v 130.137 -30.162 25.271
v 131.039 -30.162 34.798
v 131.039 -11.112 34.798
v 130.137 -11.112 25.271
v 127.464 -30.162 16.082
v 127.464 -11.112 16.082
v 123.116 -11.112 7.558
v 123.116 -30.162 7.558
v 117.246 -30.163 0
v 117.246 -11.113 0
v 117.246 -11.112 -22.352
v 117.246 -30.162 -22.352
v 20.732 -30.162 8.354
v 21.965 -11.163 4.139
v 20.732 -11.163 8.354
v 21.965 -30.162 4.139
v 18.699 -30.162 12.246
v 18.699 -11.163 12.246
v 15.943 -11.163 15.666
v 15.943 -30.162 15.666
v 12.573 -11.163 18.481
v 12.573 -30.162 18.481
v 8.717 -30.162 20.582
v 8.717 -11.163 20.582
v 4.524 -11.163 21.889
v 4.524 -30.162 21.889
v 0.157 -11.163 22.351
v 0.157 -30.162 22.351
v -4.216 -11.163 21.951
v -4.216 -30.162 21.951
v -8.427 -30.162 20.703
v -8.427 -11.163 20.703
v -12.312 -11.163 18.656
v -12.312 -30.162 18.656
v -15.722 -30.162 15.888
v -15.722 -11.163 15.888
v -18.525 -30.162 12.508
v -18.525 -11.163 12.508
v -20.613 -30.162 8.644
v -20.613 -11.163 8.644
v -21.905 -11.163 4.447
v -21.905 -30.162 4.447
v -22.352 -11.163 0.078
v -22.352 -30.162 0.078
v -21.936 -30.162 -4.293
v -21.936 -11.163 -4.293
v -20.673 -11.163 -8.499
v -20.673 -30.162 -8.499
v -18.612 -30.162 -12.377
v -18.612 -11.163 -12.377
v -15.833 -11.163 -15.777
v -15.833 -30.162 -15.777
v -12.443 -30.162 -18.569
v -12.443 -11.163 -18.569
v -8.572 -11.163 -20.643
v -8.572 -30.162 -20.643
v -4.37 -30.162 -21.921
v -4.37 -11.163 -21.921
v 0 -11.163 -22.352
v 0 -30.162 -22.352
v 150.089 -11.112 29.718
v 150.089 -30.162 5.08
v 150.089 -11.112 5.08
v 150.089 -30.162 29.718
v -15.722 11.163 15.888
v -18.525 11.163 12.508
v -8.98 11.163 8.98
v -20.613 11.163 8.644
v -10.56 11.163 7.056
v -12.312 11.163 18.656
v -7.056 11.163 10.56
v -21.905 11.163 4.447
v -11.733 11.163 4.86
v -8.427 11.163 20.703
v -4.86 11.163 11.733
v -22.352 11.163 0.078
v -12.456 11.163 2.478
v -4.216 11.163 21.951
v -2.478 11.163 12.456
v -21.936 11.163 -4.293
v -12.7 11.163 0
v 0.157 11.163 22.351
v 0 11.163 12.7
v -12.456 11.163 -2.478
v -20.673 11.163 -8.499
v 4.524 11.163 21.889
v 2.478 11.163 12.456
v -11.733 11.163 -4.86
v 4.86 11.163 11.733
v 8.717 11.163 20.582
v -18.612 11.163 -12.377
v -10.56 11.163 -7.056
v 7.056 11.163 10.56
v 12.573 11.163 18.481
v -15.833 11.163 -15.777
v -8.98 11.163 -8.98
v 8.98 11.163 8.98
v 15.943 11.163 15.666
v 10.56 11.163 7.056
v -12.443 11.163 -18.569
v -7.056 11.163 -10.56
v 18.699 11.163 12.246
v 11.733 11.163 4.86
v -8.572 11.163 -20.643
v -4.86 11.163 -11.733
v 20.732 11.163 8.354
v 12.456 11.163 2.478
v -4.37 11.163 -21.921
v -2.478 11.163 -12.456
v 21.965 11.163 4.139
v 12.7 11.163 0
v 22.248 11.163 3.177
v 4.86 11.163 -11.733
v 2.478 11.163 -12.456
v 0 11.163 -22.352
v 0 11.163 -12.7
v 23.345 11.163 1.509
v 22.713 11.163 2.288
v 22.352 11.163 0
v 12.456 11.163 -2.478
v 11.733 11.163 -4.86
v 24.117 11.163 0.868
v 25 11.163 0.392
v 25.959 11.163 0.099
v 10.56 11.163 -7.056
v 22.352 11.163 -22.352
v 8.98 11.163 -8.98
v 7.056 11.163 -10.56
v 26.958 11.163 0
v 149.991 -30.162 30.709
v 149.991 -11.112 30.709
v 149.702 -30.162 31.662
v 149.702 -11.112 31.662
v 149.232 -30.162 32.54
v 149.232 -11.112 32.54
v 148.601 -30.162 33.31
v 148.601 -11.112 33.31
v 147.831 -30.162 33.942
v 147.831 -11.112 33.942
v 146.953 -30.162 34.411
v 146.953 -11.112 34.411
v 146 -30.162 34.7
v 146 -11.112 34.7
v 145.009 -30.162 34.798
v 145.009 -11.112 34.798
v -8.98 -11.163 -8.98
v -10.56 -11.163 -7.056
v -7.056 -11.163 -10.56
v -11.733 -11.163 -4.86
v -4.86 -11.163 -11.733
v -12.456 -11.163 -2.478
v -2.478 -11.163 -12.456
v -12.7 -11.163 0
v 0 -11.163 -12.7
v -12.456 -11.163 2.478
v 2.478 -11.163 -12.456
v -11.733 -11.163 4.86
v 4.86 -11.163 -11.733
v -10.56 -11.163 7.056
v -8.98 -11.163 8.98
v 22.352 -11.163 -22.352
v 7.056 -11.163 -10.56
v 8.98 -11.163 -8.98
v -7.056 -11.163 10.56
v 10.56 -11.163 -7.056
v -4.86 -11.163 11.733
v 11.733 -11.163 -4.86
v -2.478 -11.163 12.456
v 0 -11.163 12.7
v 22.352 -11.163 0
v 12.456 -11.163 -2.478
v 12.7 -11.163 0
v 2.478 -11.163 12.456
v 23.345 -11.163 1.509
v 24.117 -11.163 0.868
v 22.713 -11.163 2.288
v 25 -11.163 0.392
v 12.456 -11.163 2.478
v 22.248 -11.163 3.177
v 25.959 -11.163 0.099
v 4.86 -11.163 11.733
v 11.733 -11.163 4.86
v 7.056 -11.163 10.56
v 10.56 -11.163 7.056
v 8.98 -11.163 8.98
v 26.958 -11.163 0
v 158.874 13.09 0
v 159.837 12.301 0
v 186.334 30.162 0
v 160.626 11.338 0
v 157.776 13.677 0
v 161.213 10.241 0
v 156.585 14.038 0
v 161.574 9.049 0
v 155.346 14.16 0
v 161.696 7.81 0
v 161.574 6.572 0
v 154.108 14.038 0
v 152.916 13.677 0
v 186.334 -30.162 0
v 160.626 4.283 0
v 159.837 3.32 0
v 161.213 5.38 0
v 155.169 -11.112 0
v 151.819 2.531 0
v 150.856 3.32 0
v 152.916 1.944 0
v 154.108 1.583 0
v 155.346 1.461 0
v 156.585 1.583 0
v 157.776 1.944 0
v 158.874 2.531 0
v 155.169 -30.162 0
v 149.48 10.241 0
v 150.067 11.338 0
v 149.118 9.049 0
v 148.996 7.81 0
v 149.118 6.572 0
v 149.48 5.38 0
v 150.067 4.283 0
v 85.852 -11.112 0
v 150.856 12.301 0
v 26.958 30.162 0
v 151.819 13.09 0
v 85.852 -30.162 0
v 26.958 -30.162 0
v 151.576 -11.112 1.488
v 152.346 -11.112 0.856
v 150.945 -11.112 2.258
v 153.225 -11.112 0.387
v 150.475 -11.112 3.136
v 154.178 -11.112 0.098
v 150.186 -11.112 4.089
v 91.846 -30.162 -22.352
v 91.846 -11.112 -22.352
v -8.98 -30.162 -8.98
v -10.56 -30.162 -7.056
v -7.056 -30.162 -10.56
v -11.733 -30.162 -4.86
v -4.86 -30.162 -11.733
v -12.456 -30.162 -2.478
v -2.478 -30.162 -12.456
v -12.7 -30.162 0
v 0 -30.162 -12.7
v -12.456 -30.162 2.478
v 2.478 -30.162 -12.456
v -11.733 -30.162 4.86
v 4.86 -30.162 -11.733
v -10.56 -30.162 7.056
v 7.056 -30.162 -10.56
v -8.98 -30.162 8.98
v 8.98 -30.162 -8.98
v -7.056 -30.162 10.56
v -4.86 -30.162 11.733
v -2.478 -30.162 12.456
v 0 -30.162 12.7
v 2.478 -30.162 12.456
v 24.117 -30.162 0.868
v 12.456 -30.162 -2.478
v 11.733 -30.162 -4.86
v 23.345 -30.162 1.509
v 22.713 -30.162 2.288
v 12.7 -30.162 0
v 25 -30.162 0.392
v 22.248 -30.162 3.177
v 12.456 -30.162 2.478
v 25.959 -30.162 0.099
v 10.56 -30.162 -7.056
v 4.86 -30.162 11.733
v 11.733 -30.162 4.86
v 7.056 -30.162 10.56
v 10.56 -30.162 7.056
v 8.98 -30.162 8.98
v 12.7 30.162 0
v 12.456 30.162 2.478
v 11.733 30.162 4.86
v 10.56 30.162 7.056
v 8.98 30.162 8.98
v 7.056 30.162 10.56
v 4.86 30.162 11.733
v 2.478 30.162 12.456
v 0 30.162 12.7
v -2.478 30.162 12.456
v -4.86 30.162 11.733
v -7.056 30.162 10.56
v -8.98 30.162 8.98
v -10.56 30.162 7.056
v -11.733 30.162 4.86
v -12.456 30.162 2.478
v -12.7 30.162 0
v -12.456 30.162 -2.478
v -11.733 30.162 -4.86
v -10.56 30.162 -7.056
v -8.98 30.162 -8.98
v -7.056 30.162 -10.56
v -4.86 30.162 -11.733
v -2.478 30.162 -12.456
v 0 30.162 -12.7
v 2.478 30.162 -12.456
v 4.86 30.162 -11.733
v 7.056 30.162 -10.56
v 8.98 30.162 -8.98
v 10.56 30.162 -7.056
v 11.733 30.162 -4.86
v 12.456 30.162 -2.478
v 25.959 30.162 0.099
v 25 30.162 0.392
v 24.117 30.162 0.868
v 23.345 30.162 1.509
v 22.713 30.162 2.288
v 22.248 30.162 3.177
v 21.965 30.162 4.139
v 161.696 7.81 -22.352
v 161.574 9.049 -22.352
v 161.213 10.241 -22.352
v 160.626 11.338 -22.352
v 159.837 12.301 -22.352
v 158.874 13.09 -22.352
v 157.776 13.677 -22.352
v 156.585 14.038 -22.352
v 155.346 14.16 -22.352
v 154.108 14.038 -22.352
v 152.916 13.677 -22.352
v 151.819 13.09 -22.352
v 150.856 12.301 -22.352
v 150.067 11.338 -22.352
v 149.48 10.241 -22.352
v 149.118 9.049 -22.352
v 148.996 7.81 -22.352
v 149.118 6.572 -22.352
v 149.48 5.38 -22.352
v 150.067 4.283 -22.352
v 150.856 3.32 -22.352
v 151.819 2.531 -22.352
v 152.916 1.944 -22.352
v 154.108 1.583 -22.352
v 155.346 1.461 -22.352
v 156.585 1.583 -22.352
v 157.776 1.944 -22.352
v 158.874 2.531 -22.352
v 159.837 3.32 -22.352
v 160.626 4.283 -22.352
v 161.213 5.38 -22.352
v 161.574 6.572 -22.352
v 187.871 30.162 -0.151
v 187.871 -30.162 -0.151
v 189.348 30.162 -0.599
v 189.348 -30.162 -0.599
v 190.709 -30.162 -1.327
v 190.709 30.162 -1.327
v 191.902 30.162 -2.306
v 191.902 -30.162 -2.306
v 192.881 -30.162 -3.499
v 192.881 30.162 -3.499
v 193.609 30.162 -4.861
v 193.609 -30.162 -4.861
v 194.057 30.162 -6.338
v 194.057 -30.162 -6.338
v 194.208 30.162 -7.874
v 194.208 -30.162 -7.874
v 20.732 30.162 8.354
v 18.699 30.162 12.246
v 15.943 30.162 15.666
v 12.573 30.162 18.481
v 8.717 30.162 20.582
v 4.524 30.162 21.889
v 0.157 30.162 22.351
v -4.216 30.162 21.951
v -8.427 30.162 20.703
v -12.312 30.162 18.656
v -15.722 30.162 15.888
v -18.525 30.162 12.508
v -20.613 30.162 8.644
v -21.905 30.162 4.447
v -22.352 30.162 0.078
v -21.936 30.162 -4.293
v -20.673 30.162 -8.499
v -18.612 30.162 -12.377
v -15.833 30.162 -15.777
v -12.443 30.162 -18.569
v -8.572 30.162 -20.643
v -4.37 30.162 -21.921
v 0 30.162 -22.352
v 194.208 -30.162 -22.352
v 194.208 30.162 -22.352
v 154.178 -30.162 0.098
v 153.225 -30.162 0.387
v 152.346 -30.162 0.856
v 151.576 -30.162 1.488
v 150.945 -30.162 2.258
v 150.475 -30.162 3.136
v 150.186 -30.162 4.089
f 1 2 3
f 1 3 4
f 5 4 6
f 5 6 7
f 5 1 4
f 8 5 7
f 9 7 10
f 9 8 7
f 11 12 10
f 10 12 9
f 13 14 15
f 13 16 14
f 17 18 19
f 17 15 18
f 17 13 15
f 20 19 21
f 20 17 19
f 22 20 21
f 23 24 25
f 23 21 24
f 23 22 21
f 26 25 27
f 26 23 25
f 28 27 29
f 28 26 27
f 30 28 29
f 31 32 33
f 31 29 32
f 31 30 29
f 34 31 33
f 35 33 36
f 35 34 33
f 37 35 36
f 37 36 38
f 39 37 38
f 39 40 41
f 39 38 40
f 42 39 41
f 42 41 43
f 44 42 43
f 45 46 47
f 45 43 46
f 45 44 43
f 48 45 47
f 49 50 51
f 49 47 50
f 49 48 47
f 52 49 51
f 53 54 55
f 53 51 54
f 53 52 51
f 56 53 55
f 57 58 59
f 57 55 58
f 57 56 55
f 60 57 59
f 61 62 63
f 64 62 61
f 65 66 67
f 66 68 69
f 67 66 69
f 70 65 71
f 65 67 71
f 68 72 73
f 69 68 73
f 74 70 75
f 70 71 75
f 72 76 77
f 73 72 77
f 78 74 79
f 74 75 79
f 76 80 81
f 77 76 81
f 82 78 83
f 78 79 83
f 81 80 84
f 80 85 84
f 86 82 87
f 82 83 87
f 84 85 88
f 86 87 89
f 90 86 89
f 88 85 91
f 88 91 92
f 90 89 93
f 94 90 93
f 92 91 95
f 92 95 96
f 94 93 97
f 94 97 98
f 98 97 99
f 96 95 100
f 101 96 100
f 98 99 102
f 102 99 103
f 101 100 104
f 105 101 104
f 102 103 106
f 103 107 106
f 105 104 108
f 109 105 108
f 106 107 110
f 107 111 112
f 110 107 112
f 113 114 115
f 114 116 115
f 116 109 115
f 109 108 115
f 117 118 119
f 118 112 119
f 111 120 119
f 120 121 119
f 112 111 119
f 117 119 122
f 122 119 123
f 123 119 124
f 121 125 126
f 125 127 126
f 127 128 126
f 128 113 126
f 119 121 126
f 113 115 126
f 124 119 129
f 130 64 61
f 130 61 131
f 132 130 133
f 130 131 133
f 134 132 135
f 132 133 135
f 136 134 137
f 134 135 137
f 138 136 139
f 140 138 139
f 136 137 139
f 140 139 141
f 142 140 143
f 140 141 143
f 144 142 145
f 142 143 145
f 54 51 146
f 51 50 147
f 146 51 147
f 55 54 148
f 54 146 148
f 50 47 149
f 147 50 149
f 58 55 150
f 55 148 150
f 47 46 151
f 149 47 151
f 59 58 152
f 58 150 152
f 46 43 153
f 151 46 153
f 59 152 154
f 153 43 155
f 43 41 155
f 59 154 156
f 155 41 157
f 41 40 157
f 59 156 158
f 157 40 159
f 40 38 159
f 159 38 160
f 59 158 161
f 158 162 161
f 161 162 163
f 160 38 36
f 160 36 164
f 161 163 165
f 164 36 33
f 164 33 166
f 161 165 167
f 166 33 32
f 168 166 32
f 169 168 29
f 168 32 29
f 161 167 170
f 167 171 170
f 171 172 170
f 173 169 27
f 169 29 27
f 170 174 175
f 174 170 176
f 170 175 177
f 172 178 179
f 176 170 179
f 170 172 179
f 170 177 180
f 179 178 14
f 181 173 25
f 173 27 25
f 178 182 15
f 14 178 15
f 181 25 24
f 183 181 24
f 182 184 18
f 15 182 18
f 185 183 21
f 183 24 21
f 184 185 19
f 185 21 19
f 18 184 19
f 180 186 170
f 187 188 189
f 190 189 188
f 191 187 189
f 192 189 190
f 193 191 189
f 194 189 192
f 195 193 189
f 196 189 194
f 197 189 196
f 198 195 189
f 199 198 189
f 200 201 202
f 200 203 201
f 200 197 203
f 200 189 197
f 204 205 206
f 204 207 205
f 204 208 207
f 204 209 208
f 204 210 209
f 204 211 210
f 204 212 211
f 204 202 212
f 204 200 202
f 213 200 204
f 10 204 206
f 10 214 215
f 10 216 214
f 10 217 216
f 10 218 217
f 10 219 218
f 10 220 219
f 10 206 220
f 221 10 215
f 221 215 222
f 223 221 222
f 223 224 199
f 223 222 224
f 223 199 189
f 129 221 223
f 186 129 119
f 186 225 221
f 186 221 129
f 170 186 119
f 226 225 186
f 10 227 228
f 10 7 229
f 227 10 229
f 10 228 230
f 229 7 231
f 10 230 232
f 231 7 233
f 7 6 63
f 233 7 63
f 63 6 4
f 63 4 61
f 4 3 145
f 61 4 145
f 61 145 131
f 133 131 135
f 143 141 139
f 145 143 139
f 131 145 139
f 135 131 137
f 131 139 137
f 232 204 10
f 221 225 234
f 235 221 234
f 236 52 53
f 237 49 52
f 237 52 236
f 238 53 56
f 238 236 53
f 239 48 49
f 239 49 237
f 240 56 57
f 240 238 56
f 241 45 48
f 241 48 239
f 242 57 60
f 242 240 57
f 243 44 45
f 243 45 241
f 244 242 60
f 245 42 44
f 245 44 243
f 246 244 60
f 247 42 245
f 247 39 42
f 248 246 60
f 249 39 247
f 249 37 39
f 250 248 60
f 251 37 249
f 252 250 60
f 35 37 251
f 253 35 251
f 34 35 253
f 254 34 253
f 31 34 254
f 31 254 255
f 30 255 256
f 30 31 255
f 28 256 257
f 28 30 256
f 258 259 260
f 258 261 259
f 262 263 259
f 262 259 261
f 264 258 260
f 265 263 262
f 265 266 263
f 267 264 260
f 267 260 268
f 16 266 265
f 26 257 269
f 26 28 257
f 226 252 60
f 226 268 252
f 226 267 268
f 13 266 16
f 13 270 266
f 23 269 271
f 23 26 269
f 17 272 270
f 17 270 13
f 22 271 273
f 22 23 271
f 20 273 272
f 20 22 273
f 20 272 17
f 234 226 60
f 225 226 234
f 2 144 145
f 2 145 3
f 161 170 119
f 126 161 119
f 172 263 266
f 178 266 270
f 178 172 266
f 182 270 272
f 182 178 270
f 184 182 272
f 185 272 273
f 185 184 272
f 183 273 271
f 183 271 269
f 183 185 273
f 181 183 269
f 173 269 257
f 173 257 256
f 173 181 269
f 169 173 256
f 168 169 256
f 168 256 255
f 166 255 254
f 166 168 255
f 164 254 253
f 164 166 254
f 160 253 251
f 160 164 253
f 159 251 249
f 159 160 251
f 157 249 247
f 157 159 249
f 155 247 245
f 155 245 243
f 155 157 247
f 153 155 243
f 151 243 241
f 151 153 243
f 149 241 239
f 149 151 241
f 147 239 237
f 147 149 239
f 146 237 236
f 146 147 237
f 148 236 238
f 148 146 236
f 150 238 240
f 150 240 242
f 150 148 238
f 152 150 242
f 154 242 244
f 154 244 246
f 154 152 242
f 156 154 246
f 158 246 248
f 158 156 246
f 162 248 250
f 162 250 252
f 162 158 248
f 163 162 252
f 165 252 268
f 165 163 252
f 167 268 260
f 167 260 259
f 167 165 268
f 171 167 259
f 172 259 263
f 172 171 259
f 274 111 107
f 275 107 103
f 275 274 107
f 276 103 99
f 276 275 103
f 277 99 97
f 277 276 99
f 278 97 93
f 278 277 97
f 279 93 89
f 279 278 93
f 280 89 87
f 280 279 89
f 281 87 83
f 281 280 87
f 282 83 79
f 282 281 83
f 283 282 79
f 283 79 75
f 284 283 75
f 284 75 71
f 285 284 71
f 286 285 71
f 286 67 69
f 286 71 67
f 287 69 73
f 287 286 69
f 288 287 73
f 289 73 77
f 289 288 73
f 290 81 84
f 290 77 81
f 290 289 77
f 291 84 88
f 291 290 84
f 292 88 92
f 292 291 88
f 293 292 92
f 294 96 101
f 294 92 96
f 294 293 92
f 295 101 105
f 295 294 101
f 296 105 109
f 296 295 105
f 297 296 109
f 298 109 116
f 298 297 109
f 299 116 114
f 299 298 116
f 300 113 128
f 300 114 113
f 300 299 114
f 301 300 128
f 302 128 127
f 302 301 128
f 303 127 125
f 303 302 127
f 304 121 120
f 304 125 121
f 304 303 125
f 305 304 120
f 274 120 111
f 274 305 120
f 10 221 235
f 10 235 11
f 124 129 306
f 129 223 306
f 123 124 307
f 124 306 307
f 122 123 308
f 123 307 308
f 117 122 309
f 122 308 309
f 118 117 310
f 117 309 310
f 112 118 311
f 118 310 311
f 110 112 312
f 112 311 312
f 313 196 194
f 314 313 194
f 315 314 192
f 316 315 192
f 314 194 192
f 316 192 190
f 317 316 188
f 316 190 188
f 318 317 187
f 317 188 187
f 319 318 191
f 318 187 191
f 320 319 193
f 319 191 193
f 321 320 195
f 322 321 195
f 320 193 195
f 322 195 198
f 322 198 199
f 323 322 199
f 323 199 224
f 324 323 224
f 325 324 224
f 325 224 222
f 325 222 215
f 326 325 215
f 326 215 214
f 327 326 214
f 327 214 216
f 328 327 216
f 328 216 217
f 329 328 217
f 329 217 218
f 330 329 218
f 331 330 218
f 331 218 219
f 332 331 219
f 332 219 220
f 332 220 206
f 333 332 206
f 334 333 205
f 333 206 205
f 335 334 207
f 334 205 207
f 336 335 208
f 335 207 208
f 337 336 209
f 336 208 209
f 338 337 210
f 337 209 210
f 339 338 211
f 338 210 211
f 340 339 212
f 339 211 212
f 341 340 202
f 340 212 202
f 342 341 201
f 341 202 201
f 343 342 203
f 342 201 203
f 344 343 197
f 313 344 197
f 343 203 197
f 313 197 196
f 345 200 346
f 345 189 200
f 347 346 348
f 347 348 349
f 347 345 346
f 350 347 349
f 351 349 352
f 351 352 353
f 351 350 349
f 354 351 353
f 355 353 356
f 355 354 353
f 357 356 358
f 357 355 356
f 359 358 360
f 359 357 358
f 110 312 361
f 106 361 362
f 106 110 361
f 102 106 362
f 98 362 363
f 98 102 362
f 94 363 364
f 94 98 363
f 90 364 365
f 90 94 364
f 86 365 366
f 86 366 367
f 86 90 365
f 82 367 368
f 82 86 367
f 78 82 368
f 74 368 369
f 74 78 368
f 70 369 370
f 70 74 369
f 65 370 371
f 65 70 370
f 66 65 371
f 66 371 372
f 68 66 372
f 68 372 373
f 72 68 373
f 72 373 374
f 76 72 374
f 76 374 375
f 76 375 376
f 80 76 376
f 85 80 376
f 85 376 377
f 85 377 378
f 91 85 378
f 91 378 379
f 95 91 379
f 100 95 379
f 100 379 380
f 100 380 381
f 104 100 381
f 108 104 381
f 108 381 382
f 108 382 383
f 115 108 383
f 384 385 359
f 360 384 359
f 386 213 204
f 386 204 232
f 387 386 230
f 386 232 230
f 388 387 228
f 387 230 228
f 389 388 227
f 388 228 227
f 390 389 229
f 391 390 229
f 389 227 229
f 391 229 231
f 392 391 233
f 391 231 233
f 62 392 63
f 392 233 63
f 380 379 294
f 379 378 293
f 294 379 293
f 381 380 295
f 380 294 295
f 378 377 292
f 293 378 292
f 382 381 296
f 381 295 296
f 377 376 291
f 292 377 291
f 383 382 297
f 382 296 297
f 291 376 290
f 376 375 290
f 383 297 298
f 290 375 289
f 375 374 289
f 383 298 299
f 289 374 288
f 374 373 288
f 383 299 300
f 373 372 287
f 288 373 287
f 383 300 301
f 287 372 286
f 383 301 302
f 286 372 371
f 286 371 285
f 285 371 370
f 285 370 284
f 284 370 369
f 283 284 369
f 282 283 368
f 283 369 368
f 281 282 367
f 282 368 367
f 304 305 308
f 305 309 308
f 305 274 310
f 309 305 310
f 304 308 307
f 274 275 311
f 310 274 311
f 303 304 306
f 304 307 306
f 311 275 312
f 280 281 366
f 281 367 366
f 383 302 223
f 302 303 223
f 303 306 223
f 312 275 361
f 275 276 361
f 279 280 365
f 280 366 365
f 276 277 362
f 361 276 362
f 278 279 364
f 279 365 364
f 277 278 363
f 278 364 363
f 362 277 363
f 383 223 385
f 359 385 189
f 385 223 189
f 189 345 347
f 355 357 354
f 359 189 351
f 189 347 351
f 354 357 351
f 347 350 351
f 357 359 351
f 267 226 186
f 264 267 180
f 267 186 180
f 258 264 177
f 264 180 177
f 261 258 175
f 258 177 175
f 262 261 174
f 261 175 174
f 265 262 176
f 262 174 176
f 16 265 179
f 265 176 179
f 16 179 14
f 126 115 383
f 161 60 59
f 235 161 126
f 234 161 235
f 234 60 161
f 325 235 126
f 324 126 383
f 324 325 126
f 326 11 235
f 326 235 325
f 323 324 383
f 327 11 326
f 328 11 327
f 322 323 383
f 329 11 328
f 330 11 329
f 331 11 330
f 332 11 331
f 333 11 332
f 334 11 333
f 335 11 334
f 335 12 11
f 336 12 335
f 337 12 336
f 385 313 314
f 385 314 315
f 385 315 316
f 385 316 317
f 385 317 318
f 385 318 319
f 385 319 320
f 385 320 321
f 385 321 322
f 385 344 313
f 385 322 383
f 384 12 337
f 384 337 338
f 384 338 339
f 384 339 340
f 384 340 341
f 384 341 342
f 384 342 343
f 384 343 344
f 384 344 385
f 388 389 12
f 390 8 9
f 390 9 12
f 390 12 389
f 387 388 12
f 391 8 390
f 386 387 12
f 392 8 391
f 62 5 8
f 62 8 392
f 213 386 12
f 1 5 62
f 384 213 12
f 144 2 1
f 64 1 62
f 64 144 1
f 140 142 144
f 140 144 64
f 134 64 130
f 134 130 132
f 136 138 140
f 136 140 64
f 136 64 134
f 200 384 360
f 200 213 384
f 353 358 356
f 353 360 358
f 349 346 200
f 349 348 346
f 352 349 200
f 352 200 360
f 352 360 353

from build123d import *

# Parameters (mm, degrees)
F0_R          = 12.7
F0_W          = 76.962
F0_H          = 22.352
F1_DEPTH      = 30.1625
F2_W          = 44.704
F2_H          = 22.3266
F3_DEPTH      = 22.353
F3_DEPTH_BACK = 22.353
F2_R          = 6.35
F4_DEPTH      = 22.353
F6_DEPTH      = 19.05
F8_DEPTH      = 19.05
F9_R          = 7.874
F10_R         = 5.08


with BuildPart() as f1:
    # F0 (on Front) → F1 (new body, symmetric)
    with BuildSketch(Plane.XZ):
        with BuildLine():
            ThreePointArc((0, -22.352), (15.8052507731, -15.8052507731), (22.352, 0))
            ThreePointArc((22.352, 0), (-15.8052507731, 15.8052507731), (0, -22.352))
        make_face()
        Circle(F0_R, mode=Mode.SUBTRACT)
        with BuildLine():
            Line((85.852, 0), (22.352, 0))
            ThreePointArc((22.352, 0), (15.8052507731, -15.8052507731), (0, -22.352))
            Line((0, -22.352), (91.8464, -22.352))
            Line((91.8464, -22.352), (85.852, 0))
        make_face()
        with Locations((155.7274, -11.176)):
            Rectangle(F0_W, F0_H)
        Polygon((117.2464, 0), (85.852, 0), (91.8464, -22.352), (117.2464, -22.352), align=None)
    extrude(amount=F1_DEPTH, both=True)

    # F2 (on face) → F3 (cut, two sides)
    with BuildSketch(Plane.XY) as f3_sk:
        Rectangle(F2_W, F2_H)
    extrude(amount=F3_DEPTH, mode=Mode.SUBTRACT)
    extrude(f3_sk.sketch, amount=-F3_DEPTH_BACK, mode=Mode.SUBTRACT)

    # F2 (on face) → F4 (cut, through all)
    with BuildSketch(Plane.XY):
        with Locations((155.3464, 7.8105)):
            Circle(F2_R)
    extrude(amount=-F4_DEPTH, mode=Mode.SUBTRACT)

    # F5 (on face) → F6 (cut)
    with BuildSketch(Plane.XZ.offset(30.1625)):
        Polygon((117.2464, 0), (85.852, 0), (91.8464, -22.352), (117.2464, -22.352), align=None)
    extrude(amount=-F6_DEPTH, mode=Mode.SUBTRACT)

    # F7 (on face) → F8 (join)
    with BuildSketch(Plane.XZ.offset(30.1625)):
        with BuildLine():
            Line((117.2464, 0), (150.0886, 0))
            Line((150.0886, 0), (150.0886, 34.798))
            Line((150.0886, 34.798), (131.0386, 34.798))
            ThreePointArc((131.0386, 34.798), (127.4644153616, 16.0823576341), (117.2464, 0))
        make_face()
    extrude(amount=-F8_DEPTH)

    # F9
    f9_edges = [f1.edges().sort_by_distance(p)[0] for p in [
        (194.2084, 0, 0),
    ]]
    fillet(f9_edges, radius=F9_R)

    # F10
    f10_edges = [f1.edges().sort_by_distance(p)[0] for p in [
        (150.0886, -20.6375, 34.798),
        (150.0886, -20.6375, 0),
        (22.352, 20.6629, 0),
        (22.352, -20.6629, 0),
    ]]
    fillet(f10_edges, radius=F10_R)


solid = f1.part
